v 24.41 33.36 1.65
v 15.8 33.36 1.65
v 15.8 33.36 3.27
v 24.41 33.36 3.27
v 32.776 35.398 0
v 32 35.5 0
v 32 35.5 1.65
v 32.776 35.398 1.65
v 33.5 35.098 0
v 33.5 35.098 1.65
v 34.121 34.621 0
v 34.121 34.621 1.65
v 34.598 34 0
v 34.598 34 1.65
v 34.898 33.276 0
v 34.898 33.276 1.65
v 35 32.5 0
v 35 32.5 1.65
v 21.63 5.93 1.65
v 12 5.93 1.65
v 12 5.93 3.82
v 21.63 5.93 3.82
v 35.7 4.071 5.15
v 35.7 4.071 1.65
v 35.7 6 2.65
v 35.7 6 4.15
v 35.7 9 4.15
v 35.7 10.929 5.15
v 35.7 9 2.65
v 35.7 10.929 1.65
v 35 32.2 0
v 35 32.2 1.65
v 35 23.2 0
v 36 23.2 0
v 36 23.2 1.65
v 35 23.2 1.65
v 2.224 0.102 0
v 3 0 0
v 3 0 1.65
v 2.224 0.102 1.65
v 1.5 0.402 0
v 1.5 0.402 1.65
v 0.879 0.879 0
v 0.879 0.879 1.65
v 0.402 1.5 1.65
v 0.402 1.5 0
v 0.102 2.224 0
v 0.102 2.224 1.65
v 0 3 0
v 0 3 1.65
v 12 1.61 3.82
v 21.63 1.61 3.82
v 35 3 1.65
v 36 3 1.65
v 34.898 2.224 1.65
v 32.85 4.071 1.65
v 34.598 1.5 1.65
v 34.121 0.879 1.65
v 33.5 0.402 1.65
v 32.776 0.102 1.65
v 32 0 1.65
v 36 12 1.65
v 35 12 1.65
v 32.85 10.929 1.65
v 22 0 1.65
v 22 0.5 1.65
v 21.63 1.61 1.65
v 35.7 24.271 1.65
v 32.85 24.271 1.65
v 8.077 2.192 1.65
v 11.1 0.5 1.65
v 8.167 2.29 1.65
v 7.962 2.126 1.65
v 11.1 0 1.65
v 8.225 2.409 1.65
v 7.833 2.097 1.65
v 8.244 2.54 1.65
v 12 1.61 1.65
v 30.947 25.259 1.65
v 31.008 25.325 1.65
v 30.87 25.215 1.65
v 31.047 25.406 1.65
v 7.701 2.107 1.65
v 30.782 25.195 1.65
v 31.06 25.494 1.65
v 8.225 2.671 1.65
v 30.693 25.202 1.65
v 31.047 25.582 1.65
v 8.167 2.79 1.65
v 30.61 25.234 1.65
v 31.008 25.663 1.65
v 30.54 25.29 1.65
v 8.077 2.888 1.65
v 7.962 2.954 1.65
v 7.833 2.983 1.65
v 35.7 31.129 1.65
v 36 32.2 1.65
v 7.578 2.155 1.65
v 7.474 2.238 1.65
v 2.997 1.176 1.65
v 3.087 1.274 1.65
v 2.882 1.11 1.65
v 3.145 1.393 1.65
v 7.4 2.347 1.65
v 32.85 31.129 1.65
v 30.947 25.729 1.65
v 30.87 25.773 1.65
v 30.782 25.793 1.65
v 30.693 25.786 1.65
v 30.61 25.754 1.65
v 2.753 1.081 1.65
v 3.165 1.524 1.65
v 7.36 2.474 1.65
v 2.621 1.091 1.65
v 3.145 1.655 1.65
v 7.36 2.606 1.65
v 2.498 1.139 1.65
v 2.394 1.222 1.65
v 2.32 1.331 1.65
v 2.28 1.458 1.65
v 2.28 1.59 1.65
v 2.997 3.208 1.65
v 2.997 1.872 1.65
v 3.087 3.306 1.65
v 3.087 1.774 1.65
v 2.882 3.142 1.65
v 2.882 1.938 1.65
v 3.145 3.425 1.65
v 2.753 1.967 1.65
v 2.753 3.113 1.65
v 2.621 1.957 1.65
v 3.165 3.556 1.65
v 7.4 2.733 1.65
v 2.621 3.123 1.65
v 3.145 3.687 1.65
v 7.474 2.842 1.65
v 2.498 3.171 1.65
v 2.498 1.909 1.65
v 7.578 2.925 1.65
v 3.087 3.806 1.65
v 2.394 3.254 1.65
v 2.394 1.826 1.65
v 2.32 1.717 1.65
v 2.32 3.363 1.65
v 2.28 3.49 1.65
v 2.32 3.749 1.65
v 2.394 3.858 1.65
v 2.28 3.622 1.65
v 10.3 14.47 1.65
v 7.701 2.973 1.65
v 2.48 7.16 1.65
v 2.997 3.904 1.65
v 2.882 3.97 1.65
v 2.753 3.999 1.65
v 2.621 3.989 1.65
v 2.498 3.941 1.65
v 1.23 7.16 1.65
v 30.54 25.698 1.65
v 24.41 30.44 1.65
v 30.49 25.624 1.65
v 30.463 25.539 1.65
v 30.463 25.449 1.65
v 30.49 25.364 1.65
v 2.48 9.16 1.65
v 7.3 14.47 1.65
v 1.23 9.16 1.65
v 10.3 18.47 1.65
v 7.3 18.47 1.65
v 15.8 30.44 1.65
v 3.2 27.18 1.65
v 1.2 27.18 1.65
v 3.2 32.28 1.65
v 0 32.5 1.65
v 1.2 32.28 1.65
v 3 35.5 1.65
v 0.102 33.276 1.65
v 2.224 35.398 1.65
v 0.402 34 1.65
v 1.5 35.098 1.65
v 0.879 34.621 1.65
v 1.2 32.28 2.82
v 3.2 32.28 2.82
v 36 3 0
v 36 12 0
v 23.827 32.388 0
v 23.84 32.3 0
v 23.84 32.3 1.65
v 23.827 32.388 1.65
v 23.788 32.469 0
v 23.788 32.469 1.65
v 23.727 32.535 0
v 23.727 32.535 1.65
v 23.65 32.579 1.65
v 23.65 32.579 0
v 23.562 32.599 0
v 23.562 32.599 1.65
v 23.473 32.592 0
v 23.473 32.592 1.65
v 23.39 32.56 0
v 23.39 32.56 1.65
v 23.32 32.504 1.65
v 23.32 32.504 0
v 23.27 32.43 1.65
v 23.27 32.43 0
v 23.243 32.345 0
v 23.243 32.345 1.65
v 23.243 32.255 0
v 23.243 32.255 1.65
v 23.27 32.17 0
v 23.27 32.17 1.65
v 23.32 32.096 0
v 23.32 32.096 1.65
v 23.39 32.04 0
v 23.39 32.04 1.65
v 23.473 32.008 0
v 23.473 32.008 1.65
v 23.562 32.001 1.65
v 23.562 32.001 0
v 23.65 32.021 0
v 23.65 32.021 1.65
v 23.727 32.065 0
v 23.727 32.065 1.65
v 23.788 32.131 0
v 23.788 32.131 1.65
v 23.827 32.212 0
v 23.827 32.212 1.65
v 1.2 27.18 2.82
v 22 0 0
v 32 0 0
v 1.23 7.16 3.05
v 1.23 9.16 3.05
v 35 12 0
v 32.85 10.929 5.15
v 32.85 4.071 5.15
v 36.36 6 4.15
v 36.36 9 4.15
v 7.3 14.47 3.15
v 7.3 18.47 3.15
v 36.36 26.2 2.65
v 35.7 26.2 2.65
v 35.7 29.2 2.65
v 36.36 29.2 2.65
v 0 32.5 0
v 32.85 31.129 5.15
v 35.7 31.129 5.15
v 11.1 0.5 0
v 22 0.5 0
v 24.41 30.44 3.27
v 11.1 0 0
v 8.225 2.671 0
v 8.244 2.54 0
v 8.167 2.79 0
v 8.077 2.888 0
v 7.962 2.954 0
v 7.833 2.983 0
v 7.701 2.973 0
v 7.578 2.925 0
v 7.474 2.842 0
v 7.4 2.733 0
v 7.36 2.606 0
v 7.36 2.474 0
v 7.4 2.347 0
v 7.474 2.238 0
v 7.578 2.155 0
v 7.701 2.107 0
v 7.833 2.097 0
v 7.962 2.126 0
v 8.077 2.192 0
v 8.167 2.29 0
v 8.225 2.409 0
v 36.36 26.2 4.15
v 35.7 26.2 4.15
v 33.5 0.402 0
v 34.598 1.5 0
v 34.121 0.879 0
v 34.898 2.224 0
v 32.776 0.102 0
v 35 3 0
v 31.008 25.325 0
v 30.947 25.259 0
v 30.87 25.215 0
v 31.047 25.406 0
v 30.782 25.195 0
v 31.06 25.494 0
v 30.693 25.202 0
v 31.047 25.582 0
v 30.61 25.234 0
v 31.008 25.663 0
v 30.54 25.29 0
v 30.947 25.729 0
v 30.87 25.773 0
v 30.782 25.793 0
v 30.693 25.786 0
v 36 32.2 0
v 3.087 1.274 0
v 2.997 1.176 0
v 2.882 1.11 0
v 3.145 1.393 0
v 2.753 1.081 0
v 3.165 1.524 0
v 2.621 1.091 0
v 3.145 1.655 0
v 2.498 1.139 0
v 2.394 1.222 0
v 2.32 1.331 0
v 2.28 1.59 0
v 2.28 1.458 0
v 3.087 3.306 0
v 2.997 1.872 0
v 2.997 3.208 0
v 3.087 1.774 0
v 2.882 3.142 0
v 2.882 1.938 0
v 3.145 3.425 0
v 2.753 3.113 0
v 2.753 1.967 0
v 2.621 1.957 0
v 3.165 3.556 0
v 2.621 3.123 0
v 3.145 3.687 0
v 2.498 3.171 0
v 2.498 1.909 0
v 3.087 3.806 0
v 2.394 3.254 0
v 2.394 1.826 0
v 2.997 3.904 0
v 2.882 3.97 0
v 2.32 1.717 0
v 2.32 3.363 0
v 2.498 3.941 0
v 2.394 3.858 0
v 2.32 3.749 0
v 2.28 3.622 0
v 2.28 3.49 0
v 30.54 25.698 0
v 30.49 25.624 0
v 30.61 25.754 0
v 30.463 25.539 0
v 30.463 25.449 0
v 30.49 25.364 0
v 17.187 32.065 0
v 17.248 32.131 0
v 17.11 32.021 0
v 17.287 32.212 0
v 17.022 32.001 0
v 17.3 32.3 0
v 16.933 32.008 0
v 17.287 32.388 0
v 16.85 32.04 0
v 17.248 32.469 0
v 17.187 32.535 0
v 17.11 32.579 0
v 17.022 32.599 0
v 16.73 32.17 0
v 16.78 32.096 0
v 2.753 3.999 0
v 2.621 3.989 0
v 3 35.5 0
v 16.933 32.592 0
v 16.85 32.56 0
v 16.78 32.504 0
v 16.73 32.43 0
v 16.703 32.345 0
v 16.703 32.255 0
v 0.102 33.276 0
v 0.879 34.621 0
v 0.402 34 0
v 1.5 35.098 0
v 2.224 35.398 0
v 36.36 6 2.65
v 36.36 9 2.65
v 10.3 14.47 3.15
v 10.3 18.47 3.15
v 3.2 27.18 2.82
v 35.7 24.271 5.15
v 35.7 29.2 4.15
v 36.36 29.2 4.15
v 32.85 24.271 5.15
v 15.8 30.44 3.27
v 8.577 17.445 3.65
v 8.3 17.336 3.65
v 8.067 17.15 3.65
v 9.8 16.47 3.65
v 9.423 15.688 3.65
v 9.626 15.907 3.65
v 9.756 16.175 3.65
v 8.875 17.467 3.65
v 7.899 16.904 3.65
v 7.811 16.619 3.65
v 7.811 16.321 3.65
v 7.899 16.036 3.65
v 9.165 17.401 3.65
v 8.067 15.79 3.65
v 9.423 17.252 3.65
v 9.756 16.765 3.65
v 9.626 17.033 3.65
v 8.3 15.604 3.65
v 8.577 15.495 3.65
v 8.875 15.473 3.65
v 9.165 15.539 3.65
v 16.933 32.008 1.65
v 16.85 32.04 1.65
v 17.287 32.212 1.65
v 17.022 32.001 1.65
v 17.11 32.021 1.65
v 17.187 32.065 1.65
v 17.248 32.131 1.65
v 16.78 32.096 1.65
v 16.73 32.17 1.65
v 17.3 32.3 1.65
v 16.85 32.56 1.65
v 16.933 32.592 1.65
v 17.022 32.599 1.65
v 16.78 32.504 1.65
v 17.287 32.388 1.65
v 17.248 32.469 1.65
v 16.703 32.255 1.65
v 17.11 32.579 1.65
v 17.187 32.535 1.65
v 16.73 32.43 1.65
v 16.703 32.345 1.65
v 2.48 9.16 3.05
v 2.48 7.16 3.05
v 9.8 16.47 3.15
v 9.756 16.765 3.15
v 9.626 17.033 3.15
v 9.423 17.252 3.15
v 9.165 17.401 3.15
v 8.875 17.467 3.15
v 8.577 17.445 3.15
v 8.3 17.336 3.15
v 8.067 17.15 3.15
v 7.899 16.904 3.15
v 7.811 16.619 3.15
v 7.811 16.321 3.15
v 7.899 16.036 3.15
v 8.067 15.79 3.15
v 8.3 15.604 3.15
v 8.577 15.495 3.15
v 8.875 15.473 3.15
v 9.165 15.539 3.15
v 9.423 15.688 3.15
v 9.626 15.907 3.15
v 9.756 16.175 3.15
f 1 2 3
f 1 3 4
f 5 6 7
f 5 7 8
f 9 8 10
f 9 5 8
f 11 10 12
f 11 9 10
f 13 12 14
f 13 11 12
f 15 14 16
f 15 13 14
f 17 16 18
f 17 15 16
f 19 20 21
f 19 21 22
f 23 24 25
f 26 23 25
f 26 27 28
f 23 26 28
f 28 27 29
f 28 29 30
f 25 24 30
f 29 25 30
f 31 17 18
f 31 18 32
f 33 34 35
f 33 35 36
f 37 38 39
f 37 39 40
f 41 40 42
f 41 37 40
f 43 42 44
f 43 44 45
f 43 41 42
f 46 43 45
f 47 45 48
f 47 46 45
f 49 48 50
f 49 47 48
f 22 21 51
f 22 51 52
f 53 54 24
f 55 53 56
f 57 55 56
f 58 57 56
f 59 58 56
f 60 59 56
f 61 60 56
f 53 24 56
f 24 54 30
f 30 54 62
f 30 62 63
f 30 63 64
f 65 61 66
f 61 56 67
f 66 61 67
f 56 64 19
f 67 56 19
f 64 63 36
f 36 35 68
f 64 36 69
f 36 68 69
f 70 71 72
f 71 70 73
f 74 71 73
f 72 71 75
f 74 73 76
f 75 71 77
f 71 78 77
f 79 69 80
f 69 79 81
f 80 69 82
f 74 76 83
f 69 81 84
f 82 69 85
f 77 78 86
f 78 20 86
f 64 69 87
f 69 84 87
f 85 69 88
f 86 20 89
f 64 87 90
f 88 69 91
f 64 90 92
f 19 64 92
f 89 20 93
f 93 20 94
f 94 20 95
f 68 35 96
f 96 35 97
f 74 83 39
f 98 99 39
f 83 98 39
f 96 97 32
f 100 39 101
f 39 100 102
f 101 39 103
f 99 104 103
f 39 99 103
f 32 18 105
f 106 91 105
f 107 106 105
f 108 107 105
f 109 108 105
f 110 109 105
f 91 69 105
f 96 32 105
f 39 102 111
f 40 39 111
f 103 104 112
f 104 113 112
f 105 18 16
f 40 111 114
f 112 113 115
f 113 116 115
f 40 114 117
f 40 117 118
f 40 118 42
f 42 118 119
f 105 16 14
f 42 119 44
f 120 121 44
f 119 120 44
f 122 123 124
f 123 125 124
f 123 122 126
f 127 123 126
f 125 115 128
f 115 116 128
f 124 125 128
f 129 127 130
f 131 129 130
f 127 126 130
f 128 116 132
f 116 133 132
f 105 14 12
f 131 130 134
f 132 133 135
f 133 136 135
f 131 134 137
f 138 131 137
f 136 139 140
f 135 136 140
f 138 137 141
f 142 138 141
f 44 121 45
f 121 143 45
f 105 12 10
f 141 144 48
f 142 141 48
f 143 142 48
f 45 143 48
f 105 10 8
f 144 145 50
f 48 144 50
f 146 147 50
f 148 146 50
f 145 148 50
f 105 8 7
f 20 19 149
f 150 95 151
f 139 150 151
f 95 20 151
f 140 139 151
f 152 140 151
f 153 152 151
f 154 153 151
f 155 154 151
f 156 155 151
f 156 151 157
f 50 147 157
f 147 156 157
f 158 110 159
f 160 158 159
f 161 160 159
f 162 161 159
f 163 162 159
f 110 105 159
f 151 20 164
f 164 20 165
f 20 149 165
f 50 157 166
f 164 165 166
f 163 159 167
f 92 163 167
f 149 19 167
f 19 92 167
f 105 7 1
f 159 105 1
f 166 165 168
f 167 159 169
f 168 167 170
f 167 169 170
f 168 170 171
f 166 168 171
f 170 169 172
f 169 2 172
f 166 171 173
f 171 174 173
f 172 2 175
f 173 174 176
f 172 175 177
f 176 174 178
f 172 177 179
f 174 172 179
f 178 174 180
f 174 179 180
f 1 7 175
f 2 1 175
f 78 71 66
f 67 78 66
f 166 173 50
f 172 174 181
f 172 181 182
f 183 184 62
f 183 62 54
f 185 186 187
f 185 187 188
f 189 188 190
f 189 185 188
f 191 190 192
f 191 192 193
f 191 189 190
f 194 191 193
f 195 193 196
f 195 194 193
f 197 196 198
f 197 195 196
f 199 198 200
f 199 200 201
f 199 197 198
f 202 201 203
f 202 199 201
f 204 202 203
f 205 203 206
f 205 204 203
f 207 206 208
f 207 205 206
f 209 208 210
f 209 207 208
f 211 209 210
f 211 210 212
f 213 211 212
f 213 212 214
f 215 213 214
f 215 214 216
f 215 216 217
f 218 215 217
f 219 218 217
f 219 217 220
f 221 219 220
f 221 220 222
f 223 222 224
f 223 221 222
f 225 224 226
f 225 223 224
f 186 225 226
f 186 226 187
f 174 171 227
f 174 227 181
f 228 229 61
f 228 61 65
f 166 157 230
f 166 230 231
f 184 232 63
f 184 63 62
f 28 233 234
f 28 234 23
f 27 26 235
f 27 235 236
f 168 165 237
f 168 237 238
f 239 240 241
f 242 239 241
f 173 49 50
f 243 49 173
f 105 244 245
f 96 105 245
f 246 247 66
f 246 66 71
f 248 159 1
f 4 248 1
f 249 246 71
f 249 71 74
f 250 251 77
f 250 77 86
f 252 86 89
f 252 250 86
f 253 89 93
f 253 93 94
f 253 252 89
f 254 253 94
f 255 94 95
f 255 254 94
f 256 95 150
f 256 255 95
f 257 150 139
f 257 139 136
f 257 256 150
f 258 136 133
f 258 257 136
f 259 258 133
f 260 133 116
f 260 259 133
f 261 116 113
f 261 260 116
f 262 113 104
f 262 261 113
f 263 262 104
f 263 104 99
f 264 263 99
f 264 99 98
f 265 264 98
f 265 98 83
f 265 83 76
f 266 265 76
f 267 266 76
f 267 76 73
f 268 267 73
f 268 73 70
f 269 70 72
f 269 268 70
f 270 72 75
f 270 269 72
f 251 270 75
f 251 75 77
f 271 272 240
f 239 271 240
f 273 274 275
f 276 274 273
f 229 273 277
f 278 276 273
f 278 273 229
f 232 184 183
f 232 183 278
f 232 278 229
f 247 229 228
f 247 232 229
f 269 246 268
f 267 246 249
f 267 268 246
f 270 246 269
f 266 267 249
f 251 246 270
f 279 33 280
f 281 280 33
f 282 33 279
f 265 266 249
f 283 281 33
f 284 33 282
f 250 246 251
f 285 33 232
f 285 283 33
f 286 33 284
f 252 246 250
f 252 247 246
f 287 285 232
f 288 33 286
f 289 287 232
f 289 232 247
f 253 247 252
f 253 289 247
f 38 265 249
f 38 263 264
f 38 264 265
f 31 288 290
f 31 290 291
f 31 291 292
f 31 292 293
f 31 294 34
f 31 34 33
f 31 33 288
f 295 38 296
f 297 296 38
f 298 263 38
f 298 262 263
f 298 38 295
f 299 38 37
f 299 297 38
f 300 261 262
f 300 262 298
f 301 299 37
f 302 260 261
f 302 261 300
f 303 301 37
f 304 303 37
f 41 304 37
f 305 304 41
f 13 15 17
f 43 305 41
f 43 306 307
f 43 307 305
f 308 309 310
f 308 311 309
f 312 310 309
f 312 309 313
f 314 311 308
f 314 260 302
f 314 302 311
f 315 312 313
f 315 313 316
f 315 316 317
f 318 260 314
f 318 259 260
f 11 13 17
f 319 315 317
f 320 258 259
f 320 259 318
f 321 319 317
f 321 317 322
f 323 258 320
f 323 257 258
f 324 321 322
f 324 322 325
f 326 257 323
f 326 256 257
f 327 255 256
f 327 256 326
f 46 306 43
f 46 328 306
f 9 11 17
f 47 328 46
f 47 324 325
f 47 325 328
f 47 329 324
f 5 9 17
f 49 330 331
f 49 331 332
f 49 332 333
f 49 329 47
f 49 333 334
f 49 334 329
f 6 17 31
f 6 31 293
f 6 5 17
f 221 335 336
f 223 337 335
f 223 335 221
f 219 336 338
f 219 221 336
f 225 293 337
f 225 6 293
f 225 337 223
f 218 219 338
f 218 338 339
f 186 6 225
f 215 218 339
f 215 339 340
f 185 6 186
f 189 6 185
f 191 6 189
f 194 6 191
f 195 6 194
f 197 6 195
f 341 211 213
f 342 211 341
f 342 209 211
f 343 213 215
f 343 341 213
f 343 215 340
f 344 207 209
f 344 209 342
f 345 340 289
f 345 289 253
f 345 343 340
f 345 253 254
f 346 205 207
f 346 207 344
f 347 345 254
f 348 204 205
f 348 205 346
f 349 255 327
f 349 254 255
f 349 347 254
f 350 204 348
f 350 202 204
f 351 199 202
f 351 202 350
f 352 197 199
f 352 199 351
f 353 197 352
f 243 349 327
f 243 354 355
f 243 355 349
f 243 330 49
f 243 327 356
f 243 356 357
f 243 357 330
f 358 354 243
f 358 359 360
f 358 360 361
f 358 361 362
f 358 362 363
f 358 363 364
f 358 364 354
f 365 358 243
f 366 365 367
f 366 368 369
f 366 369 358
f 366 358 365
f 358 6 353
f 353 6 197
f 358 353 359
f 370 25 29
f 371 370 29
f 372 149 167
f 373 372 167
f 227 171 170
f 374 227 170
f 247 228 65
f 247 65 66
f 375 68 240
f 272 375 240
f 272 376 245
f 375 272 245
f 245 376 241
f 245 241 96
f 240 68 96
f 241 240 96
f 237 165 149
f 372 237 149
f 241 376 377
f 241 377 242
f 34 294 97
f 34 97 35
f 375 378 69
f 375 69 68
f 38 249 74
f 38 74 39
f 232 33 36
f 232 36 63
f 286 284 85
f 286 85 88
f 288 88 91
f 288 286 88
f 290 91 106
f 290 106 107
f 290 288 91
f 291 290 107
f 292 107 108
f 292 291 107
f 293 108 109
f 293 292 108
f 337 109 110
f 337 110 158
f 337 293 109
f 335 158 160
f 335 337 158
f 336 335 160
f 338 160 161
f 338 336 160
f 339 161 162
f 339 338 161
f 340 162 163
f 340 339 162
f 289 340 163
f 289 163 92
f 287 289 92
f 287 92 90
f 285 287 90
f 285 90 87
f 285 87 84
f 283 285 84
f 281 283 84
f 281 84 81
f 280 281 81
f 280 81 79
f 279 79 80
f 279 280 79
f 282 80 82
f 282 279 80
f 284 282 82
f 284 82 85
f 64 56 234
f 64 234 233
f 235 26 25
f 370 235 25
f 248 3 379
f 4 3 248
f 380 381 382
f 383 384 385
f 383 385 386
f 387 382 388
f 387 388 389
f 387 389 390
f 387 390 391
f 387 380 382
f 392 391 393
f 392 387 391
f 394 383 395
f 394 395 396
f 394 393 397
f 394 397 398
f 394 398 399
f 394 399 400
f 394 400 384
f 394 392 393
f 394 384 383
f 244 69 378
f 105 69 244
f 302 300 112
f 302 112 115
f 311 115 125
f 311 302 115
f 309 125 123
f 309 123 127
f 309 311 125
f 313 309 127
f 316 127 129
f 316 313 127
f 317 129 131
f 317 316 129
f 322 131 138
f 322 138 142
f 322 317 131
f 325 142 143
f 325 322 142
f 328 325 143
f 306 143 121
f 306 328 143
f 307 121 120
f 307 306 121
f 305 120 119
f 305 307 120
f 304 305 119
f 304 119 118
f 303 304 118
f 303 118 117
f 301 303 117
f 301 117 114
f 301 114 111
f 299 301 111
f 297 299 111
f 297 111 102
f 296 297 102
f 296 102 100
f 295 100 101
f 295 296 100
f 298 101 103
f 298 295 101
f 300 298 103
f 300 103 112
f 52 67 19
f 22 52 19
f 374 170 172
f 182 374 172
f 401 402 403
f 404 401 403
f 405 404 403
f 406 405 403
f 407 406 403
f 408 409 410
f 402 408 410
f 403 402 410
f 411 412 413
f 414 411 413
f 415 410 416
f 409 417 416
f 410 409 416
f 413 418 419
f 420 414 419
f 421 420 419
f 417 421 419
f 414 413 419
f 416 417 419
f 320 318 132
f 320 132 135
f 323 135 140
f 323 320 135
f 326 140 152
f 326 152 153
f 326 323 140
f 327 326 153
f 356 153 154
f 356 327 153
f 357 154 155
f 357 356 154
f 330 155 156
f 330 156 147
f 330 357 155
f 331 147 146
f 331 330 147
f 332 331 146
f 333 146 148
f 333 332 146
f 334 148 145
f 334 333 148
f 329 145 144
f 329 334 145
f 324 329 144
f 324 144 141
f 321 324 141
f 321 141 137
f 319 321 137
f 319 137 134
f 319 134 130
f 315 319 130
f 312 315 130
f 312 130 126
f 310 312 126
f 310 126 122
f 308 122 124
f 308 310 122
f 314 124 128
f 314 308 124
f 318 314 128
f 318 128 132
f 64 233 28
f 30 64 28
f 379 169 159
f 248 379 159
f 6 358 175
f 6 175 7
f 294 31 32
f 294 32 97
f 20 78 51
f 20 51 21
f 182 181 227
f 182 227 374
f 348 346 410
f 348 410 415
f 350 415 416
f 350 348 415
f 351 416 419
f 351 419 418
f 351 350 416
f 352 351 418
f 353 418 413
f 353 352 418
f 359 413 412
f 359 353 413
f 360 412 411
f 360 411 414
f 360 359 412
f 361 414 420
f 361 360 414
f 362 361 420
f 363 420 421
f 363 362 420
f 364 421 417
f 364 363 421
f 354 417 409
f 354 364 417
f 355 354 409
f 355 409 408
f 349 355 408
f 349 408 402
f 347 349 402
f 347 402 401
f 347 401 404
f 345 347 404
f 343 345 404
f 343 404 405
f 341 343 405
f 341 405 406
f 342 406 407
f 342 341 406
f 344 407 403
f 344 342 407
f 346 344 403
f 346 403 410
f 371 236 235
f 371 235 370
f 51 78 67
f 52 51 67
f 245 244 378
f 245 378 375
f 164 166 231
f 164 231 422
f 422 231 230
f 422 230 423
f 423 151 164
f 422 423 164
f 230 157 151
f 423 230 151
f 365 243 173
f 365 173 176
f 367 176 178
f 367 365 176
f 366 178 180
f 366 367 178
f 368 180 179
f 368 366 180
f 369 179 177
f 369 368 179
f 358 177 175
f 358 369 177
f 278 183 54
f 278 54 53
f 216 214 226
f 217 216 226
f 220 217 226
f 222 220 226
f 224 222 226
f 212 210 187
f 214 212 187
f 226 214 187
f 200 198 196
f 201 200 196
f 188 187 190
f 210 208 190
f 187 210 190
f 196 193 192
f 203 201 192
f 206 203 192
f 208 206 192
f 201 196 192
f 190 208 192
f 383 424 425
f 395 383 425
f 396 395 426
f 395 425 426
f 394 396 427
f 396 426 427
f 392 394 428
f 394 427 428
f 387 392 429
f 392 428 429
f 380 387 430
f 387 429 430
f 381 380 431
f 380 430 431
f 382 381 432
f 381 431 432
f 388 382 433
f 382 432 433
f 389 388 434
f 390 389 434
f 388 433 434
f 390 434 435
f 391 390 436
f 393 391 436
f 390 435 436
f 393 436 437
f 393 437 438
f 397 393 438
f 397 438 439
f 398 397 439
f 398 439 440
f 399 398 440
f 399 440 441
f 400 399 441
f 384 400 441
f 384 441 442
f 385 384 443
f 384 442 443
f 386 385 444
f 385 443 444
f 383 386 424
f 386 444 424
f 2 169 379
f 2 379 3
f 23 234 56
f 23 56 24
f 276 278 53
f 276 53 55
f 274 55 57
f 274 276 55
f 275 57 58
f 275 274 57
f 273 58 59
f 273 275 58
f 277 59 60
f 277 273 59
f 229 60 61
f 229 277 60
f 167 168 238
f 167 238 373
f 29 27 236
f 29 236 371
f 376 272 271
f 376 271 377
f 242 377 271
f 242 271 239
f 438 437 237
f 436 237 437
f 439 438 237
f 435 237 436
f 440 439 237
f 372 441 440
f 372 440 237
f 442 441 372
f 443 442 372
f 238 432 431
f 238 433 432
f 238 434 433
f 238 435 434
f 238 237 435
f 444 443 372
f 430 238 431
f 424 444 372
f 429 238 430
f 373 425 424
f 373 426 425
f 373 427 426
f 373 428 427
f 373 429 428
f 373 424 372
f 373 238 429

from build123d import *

# Parameters (mm, degrees)
MODEL_R             = 0.4445
MODEL_R_2           = 0.3
BOSS_EXTRUDE1_DEPTH = 1.65
SKETCH2_W           = 2.85
SKETCH2_H           = 6.858
BOSS_EXTRUDE2_DEPTH = 3.5
SKETCH3_W           = 1.5
SKETCH3_H           = 3
BOSS_EXTRUDE3_DEPTH = 0.66
SKETCH4_W           = 1.25
SKETCH4_H           = 2
BOSS_EXTRUDE4_DEPTH = 1.4
SKETCH5_W           = 2
SKETCH5_H           = 5.1
BOSS_EXTRUDE5_DEPTH = 1.17
SKETCH6_W           = 8.61
SKETCH6_H           = 2.92
BOSS_EXTRUDE6_DEPTH = 1.62
SKETCH7_W           = 9.63
SKETCH7_H           = 4.32
BOSS_EXTRUDE7_DEPTH = 2.17
SKETCH8_W           = 3
SKETCH8_H           = 4
BOSS_EXTRUDE8_DEPTH = 1.5
SKETCH9_R           = 1
BOSS_EXTRUDE9_DEPTH = 0.5


with BuildPart() as part:
    # Model → Boss-Extrude1 (new body)
    with BuildSketch(Plane.XY):
        with BuildLine():
            Line((3, 35.5), (32, 35.5))
            ThreePointArc((32, 35.5), (34.121320344, 34.621320344), (35, 32.5))
            Line((35, 32.5), (35, 32.2))
            Line((35, 32.2), (36, 32.2))
            Line((36, 32.2), (36, 23.2))
            Line((36, 23.2), (35, 23.2))
            Line((35, 23.2), (35, 12))
            Line((35, 12), (36, 12))
            Line((36, 12), (36, 3))
            Line((36, 3), (35, 3))
            ThreePointArc((35, 3), (34.121320344, 0.878679656), (32, 0))
            Line((32, 0), (22, 0))
            Line((22, 0), (22, 0.5))
            Line((22, 0.5), (11.1, 0.5))
            Line((11.1, 0.5), (11.1, 0))
            Line((11.1, 0), (3, 0))
            ThreePointArc((3, 0), (0.878679656, 0.878679656), (0, 3))
            Line((0, 3), (0, 32.5))
            ThreePointArc((0, 32.5), (0.878679656, 34.621320344), (3, 35.5))
        make_face()
        with Locations((7.8, 2.54)):
            Circle(MODEL_R, mode=Mode.SUBTRACT)
        with Locations((2.72, 1.524)):
            Circle(MODEL_R, mode=Mode.SUBTRACT)
        with Locations((2.72, 3.556)):
            Circle(MODEL_R, mode=Mode.SUBTRACT)
        with Locations((17, 32.3)):
            Circle(MODEL_R_2, mode=Mode.SUBTRACT)
        with Locations((23.54, 32.3)):
            Circle(MODEL_R_2, mode=Mode.SUBTRACT)
        with Locations((30.76, 25.494)):
            Circle(MODEL_R_2, mode=Mode.SUBTRACT)
    extrude(amount=BOSS_EXTRUDE1_DEPTH)

    # Sketch2 → Boss-Extrude2 (add)
    with BuildSketch(Plane.XY.offset(1.65)):
        with Locations((34.275, 27.7)):
            Rectangle(SKETCH2_W, SKETCH2_H)
        with Locations((34.275, 7.5)):
            Rectangle(SKETCH2_W, SKETCH2_H)
    extrude(amount=BOSS_EXTRUDE2_DEPTH)

    # Sketch3 → Boss-Extrude3 (add)
    with BuildSketch(Plane(origin=(35.7, 0, 0), x_dir=(0, 0, -1), z_dir=(1, 0, 0))):
        with Locations((-3.4, 27.7)):
            Rectangle(SKETCH3_W, SKETCH3_H)
        with Locations((-3.4, 7.5)):
            Rectangle(SKETCH3_W, SKETCH3_H)
    extrude(amount=BOSS_EXTRUDE3_DEPTH)

    # Sketch4 → Boss-Extrude4 (add)
    with BuildSketch(Plane.XY.offset(1.65)):
        with Locations((1.855, 8.16)):
            Rectangle(SKETCH4_W, SKETCH4_H)
    extrude(amount=BOSS_EXTRUDE4_DEPTH)

    # Sketch5 → Boss-Extrude5 (add)
    with BuildSketch(Plane.XY.offset(1.65)):
        with Locations((2.2, 29.73)):
            Rectangle(SKETCH5_W, SKETCH5_H)
    extrude(amount=BOSS_EXTRUDE5_DEPTH)

    # Sketch6 → Boss-Extrude6 (add)
    with BuildSketch(Plane.XY.offset(1.65)):
        with Locations((20.105, 31.9)):
            Rectangle(SKETCH6_W, SKETCH6_H)
    extrude(amount=BOSS_EXTRUDE6_DEPTH)

    # Sketch7 → Boss-Extrude7 (add)
    with BuildSketch(Plane.XY.offset(1.65)):
        with Locations((16.815, 3.77)):
            Rectangle(SKETCH7_W, SKETCH7_H)
    extrude(amount=BOSS_EXTRUDE7_DEPTH)

    # Sketch8 → Boss-Extrude8 (add)
    with BuildSketch(Plane.XY.offset(1.65)):
        with Locations((8.8, 16.47)):
            Rectangle(SKETCH8_W, SKETCH8_H)
    extrude(amount=BOSS_EXTRUDE8_DEPTH)

    # Sketch9 → Boss-Extrude9 (add)
    with BuildSketch(Plane.XY.offset(3.15)):
        with Locations((8.8, 16.47)):
            Circle(SKETCH9_R)
    extrude(amount=BOSS_EXTRUDE9_DEPTH)


solid = part.part
